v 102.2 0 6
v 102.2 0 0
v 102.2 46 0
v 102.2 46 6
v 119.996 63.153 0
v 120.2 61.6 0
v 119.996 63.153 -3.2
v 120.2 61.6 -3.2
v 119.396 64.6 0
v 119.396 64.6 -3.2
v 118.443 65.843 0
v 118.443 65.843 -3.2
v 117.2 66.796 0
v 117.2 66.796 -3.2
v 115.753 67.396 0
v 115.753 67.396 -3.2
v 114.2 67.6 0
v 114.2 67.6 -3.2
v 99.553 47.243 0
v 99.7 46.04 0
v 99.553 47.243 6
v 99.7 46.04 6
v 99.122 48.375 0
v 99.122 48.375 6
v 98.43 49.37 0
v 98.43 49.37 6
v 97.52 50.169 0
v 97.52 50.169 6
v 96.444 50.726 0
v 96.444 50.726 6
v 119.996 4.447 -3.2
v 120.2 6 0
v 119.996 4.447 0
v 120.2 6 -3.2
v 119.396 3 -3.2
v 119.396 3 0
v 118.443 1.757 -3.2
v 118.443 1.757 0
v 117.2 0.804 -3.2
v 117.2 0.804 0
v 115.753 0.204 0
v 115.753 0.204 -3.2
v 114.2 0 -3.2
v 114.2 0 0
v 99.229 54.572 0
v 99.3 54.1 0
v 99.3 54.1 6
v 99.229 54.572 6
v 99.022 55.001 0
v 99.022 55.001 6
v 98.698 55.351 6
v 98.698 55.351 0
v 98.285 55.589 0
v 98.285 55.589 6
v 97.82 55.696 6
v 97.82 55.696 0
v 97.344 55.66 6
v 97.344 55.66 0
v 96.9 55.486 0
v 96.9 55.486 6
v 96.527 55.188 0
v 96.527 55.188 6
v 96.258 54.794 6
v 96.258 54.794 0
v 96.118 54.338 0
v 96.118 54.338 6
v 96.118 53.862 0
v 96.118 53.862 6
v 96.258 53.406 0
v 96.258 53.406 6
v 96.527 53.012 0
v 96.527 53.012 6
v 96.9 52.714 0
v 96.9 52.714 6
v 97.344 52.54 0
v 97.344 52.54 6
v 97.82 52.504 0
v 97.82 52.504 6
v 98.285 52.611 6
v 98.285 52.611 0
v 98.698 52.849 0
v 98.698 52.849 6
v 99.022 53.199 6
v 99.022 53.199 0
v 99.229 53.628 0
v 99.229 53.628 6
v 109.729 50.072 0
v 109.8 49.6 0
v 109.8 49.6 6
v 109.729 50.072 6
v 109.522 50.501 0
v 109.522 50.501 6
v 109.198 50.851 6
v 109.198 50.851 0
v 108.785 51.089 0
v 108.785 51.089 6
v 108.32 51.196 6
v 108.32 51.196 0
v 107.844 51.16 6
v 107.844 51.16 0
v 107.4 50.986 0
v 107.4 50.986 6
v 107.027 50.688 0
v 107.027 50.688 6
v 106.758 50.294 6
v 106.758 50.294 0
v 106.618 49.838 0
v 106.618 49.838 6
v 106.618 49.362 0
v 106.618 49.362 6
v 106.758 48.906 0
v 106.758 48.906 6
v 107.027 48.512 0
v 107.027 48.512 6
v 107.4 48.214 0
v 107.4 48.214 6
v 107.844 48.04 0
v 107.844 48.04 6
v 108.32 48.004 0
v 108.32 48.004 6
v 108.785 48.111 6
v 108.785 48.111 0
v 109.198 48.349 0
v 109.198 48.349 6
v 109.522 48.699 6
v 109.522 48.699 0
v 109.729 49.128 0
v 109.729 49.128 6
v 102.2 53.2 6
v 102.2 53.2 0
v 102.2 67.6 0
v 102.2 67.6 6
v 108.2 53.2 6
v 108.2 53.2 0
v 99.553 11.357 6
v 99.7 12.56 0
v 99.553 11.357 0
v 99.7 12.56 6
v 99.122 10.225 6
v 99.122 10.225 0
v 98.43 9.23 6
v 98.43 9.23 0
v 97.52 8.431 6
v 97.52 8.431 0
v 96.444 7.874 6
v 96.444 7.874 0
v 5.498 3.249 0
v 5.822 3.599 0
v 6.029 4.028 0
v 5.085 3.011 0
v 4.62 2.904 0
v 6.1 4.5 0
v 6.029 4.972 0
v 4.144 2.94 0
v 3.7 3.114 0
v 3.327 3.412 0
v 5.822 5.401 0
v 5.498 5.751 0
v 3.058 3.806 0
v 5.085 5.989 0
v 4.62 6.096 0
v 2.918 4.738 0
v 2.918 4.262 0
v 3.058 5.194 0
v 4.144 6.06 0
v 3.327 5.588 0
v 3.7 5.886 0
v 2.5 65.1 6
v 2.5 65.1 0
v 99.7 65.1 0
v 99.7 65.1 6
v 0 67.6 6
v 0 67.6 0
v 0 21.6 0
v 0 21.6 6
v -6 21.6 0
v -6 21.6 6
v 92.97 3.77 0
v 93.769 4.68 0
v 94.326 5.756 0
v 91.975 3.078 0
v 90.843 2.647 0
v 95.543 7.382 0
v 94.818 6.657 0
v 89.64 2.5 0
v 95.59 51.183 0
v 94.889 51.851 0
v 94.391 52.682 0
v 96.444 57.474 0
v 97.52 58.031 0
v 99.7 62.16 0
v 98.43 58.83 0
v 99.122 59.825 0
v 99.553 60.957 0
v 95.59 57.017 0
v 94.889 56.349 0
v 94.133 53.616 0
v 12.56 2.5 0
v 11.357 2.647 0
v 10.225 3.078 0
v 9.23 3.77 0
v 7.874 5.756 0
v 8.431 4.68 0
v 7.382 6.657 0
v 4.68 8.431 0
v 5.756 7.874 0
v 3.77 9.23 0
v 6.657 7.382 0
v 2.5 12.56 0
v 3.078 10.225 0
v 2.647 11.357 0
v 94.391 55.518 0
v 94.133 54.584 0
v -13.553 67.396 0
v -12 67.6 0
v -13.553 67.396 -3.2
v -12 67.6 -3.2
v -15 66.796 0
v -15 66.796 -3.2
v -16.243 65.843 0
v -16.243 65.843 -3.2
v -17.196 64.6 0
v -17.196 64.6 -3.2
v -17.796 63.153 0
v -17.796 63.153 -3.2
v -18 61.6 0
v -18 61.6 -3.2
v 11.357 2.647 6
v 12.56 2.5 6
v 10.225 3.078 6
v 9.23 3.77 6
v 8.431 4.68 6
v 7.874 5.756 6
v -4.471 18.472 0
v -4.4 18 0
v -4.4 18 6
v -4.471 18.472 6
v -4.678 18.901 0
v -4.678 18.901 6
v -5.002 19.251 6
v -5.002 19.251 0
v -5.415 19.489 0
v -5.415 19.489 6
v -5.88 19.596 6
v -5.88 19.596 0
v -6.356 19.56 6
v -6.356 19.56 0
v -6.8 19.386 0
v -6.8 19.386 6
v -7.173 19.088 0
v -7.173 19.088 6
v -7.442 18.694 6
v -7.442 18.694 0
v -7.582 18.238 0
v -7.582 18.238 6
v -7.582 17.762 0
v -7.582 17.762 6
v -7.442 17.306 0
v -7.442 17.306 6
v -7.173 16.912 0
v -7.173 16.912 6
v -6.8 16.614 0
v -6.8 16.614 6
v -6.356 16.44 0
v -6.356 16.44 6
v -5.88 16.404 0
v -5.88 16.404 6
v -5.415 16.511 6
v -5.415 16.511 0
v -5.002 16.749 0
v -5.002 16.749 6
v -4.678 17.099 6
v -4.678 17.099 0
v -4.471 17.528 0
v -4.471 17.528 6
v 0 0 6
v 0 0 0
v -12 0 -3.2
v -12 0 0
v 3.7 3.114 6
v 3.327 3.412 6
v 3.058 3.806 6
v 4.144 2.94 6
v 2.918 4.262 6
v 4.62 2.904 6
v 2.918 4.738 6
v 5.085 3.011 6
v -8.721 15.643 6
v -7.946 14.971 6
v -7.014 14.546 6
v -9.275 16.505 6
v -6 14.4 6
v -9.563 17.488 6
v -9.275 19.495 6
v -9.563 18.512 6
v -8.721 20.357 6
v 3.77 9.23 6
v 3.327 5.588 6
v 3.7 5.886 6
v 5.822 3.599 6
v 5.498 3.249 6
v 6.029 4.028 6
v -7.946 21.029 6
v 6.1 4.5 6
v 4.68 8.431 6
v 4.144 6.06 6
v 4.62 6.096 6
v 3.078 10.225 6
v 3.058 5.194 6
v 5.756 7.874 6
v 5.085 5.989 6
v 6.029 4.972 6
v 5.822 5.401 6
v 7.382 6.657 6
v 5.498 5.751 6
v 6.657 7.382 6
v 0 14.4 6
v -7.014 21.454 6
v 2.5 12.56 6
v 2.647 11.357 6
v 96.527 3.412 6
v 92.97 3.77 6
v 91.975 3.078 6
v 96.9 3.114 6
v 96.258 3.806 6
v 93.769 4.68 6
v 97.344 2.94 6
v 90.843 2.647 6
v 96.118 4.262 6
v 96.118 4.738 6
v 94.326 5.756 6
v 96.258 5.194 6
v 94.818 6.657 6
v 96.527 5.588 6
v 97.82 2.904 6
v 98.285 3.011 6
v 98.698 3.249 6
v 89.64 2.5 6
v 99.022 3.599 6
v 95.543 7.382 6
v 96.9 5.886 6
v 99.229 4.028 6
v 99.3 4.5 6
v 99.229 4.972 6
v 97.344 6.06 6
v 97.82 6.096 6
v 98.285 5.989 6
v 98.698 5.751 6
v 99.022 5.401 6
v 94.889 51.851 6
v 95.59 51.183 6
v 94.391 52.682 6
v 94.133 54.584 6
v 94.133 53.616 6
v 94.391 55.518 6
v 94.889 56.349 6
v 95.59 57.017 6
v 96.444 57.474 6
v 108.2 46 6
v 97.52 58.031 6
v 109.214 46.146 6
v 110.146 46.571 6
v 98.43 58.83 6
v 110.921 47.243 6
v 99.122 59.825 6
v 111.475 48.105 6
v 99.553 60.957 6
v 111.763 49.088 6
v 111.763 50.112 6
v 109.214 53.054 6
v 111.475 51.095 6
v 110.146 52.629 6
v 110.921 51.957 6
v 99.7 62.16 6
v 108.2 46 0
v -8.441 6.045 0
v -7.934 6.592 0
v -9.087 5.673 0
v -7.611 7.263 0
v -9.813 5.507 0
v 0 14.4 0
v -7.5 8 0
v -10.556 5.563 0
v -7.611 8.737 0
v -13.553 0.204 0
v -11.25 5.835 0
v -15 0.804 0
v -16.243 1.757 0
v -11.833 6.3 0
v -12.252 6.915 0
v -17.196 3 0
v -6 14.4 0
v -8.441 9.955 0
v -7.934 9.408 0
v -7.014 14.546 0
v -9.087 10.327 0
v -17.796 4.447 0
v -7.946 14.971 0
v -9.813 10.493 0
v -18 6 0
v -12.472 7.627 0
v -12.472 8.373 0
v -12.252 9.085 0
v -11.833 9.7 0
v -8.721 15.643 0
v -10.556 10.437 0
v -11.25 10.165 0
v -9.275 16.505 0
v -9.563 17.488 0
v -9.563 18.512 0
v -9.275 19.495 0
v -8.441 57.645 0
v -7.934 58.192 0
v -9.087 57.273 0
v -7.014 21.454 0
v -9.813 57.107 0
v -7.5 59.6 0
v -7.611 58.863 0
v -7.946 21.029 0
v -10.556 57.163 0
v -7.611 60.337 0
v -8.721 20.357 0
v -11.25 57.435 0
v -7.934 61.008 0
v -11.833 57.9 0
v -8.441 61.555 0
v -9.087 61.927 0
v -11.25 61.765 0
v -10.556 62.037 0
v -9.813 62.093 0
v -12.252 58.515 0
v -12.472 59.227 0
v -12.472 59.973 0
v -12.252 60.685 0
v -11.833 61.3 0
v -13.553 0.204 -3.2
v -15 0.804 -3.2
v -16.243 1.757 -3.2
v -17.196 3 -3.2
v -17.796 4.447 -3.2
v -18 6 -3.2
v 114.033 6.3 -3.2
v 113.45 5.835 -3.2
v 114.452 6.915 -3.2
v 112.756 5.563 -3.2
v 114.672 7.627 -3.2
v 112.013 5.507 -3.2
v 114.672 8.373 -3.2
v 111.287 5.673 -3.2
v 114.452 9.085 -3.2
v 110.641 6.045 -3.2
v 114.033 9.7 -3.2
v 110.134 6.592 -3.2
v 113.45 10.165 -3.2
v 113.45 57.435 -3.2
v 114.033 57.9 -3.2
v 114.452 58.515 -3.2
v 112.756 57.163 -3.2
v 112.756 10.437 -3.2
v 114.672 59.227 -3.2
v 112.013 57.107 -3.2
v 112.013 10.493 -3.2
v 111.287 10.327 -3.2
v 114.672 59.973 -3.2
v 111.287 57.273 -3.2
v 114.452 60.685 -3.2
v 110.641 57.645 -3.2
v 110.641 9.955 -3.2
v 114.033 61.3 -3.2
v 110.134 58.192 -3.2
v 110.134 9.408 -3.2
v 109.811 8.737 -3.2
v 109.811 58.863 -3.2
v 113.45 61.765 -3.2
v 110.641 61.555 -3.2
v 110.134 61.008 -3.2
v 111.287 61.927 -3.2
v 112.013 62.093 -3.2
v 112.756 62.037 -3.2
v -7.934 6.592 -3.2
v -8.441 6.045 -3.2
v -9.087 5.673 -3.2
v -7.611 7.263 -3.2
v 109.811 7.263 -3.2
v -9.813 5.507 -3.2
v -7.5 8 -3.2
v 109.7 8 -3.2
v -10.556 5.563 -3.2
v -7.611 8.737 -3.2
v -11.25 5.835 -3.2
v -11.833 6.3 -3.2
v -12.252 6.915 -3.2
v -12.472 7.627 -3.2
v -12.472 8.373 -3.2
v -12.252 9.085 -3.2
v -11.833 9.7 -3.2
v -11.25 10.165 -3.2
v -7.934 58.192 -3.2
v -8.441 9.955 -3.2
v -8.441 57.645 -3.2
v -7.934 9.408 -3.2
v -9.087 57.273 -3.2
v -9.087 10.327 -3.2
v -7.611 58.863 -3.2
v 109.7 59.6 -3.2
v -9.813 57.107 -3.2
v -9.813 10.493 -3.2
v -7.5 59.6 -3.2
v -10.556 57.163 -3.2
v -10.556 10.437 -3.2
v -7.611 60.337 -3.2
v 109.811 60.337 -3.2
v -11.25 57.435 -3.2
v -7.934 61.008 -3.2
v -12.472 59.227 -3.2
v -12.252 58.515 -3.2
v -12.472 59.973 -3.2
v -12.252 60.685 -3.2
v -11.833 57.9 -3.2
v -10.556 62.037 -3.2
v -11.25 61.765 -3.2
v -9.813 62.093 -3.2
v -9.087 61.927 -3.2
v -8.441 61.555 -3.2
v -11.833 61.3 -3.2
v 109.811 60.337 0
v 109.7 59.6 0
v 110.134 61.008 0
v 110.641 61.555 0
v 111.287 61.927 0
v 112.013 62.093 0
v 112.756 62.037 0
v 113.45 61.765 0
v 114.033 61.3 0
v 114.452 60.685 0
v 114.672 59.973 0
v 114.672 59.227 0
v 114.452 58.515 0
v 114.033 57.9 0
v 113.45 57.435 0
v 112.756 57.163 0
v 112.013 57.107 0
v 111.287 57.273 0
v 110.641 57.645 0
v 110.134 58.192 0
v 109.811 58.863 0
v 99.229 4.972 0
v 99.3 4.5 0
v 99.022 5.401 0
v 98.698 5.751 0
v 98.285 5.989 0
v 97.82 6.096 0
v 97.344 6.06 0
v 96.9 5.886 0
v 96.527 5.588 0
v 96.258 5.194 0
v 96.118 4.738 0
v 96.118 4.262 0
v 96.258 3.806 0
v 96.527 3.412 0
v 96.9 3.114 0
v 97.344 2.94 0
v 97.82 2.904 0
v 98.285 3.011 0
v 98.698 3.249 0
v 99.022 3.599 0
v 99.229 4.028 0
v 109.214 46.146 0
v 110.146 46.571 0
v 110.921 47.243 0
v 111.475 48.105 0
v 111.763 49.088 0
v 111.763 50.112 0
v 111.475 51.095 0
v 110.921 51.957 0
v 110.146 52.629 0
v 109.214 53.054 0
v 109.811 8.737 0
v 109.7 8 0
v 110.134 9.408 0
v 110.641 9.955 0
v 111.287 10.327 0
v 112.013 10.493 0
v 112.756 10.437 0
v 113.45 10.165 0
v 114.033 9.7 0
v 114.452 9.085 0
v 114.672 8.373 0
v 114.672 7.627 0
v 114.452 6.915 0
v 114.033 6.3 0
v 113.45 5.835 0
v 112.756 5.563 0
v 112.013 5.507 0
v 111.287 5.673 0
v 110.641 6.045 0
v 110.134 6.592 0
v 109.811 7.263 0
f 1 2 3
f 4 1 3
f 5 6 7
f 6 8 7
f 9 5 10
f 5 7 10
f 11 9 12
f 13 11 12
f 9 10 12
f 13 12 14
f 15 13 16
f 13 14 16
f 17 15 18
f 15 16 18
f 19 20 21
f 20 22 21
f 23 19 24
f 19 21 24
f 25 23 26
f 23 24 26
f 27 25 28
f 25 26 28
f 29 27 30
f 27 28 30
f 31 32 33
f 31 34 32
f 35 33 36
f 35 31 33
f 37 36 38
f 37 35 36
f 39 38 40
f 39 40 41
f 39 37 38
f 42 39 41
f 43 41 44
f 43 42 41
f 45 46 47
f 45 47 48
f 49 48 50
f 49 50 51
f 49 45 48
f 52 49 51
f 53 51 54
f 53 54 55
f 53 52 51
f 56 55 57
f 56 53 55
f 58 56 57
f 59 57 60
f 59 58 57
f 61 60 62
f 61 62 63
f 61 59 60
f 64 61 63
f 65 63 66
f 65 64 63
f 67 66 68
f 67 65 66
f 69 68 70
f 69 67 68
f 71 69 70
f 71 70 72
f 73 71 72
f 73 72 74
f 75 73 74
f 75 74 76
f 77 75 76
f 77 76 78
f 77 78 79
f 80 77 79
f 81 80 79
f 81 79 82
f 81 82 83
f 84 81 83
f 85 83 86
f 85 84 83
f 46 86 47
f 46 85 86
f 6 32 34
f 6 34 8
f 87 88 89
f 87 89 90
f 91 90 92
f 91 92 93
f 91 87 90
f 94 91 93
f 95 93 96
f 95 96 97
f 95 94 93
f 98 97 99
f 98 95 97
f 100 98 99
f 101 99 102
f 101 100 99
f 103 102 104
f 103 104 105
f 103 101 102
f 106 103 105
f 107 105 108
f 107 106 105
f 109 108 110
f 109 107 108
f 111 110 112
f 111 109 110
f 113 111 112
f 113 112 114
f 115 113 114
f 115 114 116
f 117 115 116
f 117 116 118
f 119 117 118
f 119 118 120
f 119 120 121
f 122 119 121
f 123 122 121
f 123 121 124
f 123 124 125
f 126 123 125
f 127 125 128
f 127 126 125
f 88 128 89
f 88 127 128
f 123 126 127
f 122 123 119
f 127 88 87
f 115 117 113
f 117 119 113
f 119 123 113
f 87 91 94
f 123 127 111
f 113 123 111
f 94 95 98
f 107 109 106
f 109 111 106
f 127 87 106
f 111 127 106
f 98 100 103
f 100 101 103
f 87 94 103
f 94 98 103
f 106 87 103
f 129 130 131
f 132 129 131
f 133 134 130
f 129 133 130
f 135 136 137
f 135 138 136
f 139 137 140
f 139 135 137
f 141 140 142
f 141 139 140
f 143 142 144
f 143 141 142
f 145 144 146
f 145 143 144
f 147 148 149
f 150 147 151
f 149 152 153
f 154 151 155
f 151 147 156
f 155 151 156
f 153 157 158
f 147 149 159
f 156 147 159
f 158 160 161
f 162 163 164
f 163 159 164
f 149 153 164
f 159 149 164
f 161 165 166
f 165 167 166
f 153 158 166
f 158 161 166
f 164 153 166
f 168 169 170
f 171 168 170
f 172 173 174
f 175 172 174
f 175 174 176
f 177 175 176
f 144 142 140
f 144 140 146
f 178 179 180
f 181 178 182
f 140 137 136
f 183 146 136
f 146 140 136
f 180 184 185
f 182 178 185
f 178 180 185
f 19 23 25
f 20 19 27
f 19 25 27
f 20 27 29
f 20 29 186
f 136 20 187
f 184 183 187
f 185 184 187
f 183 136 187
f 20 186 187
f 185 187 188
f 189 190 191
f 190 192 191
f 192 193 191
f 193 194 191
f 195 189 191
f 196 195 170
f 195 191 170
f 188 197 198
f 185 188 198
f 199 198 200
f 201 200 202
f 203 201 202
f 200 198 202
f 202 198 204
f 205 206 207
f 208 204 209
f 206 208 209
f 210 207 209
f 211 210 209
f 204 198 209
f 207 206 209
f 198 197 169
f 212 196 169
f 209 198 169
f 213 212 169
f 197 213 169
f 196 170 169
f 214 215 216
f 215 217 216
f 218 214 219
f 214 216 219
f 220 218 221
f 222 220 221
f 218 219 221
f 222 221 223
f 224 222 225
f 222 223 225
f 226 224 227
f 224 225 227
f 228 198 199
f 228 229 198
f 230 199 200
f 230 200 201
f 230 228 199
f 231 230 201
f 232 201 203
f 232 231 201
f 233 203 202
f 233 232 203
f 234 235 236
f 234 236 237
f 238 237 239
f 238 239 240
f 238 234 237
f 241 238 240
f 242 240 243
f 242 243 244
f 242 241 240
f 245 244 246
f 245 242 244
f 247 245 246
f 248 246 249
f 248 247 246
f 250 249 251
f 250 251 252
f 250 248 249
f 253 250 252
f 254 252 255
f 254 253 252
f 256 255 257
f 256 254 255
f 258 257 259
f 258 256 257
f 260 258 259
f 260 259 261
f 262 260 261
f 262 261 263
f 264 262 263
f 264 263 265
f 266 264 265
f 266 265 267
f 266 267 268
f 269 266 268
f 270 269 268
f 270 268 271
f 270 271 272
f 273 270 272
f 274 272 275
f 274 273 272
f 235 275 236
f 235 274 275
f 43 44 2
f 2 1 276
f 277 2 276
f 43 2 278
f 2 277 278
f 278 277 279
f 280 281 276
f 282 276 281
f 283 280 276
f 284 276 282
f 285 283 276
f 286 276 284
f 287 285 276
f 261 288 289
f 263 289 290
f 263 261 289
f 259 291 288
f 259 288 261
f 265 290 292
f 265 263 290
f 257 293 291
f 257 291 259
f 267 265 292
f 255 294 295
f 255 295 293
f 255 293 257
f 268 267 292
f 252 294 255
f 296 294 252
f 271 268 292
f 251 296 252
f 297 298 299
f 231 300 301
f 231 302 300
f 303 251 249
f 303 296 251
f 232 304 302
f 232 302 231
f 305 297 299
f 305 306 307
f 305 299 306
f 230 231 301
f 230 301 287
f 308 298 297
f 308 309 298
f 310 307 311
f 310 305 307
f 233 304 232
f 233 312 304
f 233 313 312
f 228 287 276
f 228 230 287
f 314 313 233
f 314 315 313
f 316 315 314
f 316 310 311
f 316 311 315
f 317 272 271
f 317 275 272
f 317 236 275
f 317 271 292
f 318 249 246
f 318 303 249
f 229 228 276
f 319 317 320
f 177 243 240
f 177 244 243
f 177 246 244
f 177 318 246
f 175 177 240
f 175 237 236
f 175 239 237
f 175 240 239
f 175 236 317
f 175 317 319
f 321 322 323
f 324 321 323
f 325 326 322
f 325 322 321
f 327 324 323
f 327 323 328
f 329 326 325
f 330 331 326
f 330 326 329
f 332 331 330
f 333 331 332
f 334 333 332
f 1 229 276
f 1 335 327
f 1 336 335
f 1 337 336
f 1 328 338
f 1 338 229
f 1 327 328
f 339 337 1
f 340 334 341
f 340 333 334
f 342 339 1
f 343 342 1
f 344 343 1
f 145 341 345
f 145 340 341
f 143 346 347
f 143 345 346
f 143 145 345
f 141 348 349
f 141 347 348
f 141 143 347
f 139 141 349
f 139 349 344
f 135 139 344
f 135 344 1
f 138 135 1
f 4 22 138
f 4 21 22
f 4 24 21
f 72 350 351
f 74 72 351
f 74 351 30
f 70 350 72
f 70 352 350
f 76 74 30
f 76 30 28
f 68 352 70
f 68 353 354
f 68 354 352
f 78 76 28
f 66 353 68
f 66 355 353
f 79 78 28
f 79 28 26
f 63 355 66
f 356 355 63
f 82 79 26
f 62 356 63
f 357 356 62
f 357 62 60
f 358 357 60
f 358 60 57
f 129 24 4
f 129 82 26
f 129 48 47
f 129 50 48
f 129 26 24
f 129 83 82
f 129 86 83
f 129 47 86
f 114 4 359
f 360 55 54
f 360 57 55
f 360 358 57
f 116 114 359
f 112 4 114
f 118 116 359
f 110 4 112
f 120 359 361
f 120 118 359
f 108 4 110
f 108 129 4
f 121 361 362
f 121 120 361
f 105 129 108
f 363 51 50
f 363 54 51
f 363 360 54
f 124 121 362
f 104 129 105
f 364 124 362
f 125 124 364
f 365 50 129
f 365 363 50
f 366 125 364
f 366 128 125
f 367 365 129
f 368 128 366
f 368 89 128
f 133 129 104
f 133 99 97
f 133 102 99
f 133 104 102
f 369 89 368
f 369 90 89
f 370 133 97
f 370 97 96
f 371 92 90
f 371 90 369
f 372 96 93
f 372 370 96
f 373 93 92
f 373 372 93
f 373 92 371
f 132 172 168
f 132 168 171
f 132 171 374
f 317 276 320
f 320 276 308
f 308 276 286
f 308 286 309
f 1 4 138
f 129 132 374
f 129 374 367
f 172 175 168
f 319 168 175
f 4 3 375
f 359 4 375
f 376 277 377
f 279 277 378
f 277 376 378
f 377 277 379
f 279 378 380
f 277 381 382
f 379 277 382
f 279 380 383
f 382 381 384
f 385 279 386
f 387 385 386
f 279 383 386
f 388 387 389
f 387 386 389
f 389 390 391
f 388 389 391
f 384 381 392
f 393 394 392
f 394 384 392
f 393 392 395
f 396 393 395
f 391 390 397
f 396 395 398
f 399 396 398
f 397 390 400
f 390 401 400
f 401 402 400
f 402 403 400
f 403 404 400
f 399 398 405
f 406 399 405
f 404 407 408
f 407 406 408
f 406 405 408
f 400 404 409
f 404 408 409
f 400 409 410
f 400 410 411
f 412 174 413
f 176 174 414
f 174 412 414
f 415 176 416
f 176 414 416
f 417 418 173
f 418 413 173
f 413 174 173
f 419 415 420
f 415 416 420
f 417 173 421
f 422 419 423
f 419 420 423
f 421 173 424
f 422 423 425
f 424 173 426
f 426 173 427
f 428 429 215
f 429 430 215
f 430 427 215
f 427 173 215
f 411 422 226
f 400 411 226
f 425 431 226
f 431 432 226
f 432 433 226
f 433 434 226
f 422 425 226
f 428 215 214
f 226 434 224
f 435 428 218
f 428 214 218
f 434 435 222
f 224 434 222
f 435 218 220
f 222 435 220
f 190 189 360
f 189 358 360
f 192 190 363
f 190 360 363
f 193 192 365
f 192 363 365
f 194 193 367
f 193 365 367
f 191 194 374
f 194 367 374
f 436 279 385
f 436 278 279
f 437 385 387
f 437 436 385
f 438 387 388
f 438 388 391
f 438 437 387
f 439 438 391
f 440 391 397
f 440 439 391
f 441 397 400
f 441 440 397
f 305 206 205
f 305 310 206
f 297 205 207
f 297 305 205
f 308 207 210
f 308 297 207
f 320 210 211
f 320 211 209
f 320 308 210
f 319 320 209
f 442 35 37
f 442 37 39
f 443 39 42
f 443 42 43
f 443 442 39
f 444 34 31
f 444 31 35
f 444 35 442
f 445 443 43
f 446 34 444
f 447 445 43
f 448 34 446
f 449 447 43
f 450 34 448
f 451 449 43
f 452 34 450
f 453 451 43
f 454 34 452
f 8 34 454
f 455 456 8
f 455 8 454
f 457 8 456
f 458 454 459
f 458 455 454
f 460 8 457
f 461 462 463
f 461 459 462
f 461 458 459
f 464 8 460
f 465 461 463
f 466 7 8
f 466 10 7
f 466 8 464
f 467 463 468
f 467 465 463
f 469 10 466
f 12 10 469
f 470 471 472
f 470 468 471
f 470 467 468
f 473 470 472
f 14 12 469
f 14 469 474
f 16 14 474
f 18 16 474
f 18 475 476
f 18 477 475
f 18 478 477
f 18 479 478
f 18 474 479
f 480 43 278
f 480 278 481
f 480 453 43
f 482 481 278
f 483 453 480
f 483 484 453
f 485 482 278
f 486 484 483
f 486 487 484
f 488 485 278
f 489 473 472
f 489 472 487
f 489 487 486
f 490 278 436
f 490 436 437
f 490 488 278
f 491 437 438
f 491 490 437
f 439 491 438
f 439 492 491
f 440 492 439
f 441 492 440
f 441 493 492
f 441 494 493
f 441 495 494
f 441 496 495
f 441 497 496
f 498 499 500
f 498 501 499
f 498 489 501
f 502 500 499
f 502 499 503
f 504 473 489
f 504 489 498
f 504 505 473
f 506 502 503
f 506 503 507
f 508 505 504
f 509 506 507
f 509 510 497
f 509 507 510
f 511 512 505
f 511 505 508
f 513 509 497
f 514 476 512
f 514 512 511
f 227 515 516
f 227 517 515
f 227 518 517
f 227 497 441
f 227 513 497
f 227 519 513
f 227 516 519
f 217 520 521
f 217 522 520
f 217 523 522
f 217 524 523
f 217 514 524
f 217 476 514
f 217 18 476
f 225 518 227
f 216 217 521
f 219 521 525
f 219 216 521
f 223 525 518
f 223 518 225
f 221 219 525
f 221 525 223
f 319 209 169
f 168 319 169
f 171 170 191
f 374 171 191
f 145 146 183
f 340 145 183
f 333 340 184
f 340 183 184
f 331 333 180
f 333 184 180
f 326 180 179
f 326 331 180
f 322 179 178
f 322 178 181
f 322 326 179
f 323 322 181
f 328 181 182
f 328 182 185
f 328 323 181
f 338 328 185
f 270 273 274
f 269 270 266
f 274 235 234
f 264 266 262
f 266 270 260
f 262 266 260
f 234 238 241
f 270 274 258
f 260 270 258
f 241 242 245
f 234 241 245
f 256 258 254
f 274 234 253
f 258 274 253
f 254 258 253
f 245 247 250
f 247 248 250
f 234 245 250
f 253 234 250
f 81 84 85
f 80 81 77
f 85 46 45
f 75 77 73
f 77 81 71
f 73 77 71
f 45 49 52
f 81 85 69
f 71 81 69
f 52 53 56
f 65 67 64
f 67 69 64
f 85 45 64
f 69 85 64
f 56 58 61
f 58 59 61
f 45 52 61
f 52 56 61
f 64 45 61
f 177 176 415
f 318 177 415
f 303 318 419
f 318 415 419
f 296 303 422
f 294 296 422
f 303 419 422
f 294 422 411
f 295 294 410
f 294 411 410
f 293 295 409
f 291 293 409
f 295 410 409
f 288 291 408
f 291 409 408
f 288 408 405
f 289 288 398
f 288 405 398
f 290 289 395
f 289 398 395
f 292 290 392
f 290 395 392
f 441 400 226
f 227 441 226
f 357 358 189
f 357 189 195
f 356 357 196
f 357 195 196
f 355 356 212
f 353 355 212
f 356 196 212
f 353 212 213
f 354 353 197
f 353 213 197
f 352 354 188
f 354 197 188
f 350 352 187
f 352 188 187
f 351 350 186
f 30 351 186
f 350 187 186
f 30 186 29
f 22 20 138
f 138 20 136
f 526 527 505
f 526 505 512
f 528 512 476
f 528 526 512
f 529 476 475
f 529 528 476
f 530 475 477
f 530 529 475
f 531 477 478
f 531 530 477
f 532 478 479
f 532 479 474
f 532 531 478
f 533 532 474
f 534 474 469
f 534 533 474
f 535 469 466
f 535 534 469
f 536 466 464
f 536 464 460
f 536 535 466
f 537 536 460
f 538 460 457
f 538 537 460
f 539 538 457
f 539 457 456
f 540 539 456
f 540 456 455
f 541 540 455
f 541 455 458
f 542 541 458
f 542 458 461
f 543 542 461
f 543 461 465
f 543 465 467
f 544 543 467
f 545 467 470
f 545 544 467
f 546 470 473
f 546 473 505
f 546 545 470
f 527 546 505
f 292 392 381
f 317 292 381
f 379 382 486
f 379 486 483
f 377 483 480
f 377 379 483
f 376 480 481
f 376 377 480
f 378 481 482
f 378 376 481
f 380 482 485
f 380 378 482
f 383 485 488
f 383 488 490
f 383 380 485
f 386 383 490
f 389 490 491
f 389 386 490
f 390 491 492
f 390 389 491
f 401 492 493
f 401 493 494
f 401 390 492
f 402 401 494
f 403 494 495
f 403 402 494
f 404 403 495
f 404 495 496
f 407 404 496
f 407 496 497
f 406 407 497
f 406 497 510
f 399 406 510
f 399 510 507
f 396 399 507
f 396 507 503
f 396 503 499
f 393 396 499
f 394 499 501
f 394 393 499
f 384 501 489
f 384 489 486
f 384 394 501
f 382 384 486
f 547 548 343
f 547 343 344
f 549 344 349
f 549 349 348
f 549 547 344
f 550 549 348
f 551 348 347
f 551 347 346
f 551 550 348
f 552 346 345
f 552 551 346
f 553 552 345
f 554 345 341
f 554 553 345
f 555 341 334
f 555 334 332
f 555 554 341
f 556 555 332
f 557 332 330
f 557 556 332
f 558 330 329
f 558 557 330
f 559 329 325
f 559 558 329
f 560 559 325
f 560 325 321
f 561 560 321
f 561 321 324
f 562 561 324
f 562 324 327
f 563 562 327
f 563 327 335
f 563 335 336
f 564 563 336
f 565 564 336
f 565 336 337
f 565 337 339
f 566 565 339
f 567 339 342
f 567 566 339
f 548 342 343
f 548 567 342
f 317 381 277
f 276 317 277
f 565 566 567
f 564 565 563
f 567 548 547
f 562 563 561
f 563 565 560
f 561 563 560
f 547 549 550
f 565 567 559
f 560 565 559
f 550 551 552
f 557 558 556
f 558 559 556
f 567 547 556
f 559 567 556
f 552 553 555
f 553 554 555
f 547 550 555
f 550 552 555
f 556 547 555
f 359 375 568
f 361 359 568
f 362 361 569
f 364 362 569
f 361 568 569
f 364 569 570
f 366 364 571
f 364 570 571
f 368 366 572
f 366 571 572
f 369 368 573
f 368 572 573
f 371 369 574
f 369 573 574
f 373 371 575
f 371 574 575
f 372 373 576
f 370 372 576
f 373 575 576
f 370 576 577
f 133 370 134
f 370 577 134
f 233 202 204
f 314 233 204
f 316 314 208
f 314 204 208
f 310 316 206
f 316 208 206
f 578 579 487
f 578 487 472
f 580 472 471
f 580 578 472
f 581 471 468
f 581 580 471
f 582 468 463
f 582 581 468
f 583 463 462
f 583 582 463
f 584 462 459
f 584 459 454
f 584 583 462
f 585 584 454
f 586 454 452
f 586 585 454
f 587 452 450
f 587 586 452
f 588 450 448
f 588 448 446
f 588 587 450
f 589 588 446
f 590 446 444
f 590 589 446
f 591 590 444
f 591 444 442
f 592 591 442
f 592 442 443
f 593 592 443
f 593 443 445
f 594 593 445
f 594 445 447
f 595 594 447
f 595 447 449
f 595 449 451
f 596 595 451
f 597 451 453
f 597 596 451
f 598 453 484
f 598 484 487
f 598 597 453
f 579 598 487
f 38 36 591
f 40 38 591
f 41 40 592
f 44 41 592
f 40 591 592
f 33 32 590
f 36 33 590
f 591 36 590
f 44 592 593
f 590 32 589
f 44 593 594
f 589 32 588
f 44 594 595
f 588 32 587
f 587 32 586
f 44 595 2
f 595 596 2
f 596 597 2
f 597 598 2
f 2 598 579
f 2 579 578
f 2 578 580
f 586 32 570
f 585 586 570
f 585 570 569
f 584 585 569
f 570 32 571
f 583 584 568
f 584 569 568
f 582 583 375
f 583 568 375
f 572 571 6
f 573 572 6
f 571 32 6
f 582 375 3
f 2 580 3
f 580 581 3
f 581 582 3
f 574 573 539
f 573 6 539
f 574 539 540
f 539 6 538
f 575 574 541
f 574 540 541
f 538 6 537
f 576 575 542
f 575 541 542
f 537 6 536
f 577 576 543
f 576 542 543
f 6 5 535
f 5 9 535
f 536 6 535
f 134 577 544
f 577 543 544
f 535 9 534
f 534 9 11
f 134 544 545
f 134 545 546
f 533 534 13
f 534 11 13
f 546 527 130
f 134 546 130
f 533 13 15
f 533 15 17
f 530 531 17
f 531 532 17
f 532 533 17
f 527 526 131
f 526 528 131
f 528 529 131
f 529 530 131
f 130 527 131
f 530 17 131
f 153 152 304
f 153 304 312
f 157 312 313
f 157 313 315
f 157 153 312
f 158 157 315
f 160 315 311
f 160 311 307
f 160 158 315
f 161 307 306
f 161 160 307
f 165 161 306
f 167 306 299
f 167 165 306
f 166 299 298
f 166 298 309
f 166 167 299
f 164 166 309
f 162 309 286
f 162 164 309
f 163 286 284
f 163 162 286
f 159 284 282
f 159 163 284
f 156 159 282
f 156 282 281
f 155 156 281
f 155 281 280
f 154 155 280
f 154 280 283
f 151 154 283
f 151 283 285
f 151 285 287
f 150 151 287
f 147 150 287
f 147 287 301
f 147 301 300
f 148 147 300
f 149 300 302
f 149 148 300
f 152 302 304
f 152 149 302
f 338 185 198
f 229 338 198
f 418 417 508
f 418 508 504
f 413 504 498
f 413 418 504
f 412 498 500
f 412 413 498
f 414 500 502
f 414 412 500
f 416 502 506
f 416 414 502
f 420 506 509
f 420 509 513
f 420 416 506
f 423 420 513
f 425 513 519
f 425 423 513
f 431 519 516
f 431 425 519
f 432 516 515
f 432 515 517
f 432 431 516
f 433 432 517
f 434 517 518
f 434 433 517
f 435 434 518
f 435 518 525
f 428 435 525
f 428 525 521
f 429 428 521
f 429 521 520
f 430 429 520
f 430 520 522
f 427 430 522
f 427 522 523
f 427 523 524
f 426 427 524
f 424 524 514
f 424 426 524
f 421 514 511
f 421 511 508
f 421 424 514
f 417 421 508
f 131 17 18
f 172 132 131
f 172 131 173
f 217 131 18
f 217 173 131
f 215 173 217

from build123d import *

# Parameters (mm, degrees)
SKETCH1_R           = 1.6
BOSS_EXTRUDE1_DEPTH = 6
SKETCH2_W           = 138.2
SKETCH2_H           = 67.6
SKETCH2_R           = 2.5
BOSS_EXTRUDE2_DEPTH = 3.2
FILLET1_R           = 6
FILLET2_R           = 5
FILLET3_R           = 5


with BuildPart() as part:
    # Sketch1 → Boss-Extrude1 (new body)
    with BuildSketch(Plane.XY):
        with BuildLine():
            Line((0, 21.6), (-6, 21.6))
            ThreePointArc((-6, 21.6), (-9.6, 18), (-6, 14.4))
            Line((-6, 14.4), (0, 14.4))
            Line((0, 14.4), (0, 0))
            Line((0, 0), (102.2, 0))
            Line((102.2, 0), (102.2, 46))
            Line((102.2, 46), (108.2, 46))
            ThreePointArc((108.2, 46), (111.8, 49.6), (108.2, 53.2))
            Line((108.2, 53.2), (102.2, 53.2))
            Line((102.2, 53.2), (102.2, 67.6))
            Line((102.2, 67.6), (0, 67.6))
            Line((0, 67.6), (0, 21.6))
        make_face()
        with Locations((-6, 18)):
            Circle(SKETCH1_R, mode=Mode.SUBTRACT)
        with BuildLine():
            Line((94.706674091, 2.5), (7.493325909, 2.5))
            ThreePointArc((7.493325909, 2.5), (7.045584412, 7.045584412), (2.5, 7.493325909))
            Line((2.5, 7.493325909), (2.5, 65.1))
            Line((2.5, 65.1), (99.7, 65.1))
            Line((99.7, 65.1), (99.7, 57.093325909))
            ThreePointArc((99.7, 57.093325909), (94.1, 54.1), (99.7, 51.106674091))
            Line((99.7, 51.106674091), (99.7, 7.493325909))
            ThreePointArc((99.7, 7.493325909), (95.154415588, 7.045584412), (94.706674091, 2.5))
        make_face(mode=Mode.SUBTRACT)
        with Locations((108.2, 49.6)):
            Circle(SKETCH1_R, mode=Mode.SUBTRACT)
        with Locations((4.5, 4.5)):
            Circle(SKETCH1_R, mode=Mode.SUBTRACT)
        with Locations((97.7, 4.5)):
            Circle(SKETCH1_R, mode=Mode.SUBTRACT)
        with Locations((97.7, 54.1)):
            Circle(SKETCH1_R, mode=Mode.SUBTRACT)
    extrude(amount=BOSS_EXTRUDE1_DEPTH)

    # Sketch2 → Boss-Extrude2 (add)
    with BuildSketch(Plane(origin=(0, 0, 0), x_dir=(-1, 0, 0), z_dir=(0, 0, -1))):
        with Locations((-51.1, 33.8)):
            Rectangle(SKETCH2_W, SKETCH2_H)
        with Locations((-112.2, 59.6)):
            Circle(SKETCH2_R, mode=Mode.SUBTRACT)
        with Locations((-112.2, 8)):
            Circle(SKETCH2_R, mode=Mode.SUBTRACT)
        with Locations(Location((10, 8, 0), (0, 0, 180))):
            Circle(SKETCH2_R, mode=Mode.SUBTRACT)
        with Locations(Location((10, 59.6, 0), (0, 0, 180))):
            Circle(SKETCH2_R, mode=Mode.SUBTRACT)
    extrude(amount=BOSS_EXTRUDE2_DEPTH)

    # Fillet1
    fillet1_edges = [part.edges().sort_by_distance(p)[0] for p in [
        (120.2, 67.6, -1.6),
        (120.2, 0, -1.6),
        (-18, 0, -1.6),
        (-18, 67.6, -1.6),
    ]]
    fillet(fillet1_edges, radius=FILLET1_R)

    # Fillet2
    fillet2_edges = [part.edges().sort_by_distance(p)[0] for p in [
        (99.7, 51.106674091, 3),
        (99.7, 57.093325909, 3),
    ]]
    fillet(fillet2_edges, radius=FILLET2_R)

    # Fillet3
    fillet3_edges = [part.edges().sort_by_distance(p)[0] for p in [
        (7.493325909, 2.5, 3),
        (94.706674091, 2.5, 3),
        (99.7, 7.493325909, 3),
        (2.5, 7.493325909, 3),
    ]]
    fillet(fillet3_edges, radius=FILLET3_R)


solid = part.part
